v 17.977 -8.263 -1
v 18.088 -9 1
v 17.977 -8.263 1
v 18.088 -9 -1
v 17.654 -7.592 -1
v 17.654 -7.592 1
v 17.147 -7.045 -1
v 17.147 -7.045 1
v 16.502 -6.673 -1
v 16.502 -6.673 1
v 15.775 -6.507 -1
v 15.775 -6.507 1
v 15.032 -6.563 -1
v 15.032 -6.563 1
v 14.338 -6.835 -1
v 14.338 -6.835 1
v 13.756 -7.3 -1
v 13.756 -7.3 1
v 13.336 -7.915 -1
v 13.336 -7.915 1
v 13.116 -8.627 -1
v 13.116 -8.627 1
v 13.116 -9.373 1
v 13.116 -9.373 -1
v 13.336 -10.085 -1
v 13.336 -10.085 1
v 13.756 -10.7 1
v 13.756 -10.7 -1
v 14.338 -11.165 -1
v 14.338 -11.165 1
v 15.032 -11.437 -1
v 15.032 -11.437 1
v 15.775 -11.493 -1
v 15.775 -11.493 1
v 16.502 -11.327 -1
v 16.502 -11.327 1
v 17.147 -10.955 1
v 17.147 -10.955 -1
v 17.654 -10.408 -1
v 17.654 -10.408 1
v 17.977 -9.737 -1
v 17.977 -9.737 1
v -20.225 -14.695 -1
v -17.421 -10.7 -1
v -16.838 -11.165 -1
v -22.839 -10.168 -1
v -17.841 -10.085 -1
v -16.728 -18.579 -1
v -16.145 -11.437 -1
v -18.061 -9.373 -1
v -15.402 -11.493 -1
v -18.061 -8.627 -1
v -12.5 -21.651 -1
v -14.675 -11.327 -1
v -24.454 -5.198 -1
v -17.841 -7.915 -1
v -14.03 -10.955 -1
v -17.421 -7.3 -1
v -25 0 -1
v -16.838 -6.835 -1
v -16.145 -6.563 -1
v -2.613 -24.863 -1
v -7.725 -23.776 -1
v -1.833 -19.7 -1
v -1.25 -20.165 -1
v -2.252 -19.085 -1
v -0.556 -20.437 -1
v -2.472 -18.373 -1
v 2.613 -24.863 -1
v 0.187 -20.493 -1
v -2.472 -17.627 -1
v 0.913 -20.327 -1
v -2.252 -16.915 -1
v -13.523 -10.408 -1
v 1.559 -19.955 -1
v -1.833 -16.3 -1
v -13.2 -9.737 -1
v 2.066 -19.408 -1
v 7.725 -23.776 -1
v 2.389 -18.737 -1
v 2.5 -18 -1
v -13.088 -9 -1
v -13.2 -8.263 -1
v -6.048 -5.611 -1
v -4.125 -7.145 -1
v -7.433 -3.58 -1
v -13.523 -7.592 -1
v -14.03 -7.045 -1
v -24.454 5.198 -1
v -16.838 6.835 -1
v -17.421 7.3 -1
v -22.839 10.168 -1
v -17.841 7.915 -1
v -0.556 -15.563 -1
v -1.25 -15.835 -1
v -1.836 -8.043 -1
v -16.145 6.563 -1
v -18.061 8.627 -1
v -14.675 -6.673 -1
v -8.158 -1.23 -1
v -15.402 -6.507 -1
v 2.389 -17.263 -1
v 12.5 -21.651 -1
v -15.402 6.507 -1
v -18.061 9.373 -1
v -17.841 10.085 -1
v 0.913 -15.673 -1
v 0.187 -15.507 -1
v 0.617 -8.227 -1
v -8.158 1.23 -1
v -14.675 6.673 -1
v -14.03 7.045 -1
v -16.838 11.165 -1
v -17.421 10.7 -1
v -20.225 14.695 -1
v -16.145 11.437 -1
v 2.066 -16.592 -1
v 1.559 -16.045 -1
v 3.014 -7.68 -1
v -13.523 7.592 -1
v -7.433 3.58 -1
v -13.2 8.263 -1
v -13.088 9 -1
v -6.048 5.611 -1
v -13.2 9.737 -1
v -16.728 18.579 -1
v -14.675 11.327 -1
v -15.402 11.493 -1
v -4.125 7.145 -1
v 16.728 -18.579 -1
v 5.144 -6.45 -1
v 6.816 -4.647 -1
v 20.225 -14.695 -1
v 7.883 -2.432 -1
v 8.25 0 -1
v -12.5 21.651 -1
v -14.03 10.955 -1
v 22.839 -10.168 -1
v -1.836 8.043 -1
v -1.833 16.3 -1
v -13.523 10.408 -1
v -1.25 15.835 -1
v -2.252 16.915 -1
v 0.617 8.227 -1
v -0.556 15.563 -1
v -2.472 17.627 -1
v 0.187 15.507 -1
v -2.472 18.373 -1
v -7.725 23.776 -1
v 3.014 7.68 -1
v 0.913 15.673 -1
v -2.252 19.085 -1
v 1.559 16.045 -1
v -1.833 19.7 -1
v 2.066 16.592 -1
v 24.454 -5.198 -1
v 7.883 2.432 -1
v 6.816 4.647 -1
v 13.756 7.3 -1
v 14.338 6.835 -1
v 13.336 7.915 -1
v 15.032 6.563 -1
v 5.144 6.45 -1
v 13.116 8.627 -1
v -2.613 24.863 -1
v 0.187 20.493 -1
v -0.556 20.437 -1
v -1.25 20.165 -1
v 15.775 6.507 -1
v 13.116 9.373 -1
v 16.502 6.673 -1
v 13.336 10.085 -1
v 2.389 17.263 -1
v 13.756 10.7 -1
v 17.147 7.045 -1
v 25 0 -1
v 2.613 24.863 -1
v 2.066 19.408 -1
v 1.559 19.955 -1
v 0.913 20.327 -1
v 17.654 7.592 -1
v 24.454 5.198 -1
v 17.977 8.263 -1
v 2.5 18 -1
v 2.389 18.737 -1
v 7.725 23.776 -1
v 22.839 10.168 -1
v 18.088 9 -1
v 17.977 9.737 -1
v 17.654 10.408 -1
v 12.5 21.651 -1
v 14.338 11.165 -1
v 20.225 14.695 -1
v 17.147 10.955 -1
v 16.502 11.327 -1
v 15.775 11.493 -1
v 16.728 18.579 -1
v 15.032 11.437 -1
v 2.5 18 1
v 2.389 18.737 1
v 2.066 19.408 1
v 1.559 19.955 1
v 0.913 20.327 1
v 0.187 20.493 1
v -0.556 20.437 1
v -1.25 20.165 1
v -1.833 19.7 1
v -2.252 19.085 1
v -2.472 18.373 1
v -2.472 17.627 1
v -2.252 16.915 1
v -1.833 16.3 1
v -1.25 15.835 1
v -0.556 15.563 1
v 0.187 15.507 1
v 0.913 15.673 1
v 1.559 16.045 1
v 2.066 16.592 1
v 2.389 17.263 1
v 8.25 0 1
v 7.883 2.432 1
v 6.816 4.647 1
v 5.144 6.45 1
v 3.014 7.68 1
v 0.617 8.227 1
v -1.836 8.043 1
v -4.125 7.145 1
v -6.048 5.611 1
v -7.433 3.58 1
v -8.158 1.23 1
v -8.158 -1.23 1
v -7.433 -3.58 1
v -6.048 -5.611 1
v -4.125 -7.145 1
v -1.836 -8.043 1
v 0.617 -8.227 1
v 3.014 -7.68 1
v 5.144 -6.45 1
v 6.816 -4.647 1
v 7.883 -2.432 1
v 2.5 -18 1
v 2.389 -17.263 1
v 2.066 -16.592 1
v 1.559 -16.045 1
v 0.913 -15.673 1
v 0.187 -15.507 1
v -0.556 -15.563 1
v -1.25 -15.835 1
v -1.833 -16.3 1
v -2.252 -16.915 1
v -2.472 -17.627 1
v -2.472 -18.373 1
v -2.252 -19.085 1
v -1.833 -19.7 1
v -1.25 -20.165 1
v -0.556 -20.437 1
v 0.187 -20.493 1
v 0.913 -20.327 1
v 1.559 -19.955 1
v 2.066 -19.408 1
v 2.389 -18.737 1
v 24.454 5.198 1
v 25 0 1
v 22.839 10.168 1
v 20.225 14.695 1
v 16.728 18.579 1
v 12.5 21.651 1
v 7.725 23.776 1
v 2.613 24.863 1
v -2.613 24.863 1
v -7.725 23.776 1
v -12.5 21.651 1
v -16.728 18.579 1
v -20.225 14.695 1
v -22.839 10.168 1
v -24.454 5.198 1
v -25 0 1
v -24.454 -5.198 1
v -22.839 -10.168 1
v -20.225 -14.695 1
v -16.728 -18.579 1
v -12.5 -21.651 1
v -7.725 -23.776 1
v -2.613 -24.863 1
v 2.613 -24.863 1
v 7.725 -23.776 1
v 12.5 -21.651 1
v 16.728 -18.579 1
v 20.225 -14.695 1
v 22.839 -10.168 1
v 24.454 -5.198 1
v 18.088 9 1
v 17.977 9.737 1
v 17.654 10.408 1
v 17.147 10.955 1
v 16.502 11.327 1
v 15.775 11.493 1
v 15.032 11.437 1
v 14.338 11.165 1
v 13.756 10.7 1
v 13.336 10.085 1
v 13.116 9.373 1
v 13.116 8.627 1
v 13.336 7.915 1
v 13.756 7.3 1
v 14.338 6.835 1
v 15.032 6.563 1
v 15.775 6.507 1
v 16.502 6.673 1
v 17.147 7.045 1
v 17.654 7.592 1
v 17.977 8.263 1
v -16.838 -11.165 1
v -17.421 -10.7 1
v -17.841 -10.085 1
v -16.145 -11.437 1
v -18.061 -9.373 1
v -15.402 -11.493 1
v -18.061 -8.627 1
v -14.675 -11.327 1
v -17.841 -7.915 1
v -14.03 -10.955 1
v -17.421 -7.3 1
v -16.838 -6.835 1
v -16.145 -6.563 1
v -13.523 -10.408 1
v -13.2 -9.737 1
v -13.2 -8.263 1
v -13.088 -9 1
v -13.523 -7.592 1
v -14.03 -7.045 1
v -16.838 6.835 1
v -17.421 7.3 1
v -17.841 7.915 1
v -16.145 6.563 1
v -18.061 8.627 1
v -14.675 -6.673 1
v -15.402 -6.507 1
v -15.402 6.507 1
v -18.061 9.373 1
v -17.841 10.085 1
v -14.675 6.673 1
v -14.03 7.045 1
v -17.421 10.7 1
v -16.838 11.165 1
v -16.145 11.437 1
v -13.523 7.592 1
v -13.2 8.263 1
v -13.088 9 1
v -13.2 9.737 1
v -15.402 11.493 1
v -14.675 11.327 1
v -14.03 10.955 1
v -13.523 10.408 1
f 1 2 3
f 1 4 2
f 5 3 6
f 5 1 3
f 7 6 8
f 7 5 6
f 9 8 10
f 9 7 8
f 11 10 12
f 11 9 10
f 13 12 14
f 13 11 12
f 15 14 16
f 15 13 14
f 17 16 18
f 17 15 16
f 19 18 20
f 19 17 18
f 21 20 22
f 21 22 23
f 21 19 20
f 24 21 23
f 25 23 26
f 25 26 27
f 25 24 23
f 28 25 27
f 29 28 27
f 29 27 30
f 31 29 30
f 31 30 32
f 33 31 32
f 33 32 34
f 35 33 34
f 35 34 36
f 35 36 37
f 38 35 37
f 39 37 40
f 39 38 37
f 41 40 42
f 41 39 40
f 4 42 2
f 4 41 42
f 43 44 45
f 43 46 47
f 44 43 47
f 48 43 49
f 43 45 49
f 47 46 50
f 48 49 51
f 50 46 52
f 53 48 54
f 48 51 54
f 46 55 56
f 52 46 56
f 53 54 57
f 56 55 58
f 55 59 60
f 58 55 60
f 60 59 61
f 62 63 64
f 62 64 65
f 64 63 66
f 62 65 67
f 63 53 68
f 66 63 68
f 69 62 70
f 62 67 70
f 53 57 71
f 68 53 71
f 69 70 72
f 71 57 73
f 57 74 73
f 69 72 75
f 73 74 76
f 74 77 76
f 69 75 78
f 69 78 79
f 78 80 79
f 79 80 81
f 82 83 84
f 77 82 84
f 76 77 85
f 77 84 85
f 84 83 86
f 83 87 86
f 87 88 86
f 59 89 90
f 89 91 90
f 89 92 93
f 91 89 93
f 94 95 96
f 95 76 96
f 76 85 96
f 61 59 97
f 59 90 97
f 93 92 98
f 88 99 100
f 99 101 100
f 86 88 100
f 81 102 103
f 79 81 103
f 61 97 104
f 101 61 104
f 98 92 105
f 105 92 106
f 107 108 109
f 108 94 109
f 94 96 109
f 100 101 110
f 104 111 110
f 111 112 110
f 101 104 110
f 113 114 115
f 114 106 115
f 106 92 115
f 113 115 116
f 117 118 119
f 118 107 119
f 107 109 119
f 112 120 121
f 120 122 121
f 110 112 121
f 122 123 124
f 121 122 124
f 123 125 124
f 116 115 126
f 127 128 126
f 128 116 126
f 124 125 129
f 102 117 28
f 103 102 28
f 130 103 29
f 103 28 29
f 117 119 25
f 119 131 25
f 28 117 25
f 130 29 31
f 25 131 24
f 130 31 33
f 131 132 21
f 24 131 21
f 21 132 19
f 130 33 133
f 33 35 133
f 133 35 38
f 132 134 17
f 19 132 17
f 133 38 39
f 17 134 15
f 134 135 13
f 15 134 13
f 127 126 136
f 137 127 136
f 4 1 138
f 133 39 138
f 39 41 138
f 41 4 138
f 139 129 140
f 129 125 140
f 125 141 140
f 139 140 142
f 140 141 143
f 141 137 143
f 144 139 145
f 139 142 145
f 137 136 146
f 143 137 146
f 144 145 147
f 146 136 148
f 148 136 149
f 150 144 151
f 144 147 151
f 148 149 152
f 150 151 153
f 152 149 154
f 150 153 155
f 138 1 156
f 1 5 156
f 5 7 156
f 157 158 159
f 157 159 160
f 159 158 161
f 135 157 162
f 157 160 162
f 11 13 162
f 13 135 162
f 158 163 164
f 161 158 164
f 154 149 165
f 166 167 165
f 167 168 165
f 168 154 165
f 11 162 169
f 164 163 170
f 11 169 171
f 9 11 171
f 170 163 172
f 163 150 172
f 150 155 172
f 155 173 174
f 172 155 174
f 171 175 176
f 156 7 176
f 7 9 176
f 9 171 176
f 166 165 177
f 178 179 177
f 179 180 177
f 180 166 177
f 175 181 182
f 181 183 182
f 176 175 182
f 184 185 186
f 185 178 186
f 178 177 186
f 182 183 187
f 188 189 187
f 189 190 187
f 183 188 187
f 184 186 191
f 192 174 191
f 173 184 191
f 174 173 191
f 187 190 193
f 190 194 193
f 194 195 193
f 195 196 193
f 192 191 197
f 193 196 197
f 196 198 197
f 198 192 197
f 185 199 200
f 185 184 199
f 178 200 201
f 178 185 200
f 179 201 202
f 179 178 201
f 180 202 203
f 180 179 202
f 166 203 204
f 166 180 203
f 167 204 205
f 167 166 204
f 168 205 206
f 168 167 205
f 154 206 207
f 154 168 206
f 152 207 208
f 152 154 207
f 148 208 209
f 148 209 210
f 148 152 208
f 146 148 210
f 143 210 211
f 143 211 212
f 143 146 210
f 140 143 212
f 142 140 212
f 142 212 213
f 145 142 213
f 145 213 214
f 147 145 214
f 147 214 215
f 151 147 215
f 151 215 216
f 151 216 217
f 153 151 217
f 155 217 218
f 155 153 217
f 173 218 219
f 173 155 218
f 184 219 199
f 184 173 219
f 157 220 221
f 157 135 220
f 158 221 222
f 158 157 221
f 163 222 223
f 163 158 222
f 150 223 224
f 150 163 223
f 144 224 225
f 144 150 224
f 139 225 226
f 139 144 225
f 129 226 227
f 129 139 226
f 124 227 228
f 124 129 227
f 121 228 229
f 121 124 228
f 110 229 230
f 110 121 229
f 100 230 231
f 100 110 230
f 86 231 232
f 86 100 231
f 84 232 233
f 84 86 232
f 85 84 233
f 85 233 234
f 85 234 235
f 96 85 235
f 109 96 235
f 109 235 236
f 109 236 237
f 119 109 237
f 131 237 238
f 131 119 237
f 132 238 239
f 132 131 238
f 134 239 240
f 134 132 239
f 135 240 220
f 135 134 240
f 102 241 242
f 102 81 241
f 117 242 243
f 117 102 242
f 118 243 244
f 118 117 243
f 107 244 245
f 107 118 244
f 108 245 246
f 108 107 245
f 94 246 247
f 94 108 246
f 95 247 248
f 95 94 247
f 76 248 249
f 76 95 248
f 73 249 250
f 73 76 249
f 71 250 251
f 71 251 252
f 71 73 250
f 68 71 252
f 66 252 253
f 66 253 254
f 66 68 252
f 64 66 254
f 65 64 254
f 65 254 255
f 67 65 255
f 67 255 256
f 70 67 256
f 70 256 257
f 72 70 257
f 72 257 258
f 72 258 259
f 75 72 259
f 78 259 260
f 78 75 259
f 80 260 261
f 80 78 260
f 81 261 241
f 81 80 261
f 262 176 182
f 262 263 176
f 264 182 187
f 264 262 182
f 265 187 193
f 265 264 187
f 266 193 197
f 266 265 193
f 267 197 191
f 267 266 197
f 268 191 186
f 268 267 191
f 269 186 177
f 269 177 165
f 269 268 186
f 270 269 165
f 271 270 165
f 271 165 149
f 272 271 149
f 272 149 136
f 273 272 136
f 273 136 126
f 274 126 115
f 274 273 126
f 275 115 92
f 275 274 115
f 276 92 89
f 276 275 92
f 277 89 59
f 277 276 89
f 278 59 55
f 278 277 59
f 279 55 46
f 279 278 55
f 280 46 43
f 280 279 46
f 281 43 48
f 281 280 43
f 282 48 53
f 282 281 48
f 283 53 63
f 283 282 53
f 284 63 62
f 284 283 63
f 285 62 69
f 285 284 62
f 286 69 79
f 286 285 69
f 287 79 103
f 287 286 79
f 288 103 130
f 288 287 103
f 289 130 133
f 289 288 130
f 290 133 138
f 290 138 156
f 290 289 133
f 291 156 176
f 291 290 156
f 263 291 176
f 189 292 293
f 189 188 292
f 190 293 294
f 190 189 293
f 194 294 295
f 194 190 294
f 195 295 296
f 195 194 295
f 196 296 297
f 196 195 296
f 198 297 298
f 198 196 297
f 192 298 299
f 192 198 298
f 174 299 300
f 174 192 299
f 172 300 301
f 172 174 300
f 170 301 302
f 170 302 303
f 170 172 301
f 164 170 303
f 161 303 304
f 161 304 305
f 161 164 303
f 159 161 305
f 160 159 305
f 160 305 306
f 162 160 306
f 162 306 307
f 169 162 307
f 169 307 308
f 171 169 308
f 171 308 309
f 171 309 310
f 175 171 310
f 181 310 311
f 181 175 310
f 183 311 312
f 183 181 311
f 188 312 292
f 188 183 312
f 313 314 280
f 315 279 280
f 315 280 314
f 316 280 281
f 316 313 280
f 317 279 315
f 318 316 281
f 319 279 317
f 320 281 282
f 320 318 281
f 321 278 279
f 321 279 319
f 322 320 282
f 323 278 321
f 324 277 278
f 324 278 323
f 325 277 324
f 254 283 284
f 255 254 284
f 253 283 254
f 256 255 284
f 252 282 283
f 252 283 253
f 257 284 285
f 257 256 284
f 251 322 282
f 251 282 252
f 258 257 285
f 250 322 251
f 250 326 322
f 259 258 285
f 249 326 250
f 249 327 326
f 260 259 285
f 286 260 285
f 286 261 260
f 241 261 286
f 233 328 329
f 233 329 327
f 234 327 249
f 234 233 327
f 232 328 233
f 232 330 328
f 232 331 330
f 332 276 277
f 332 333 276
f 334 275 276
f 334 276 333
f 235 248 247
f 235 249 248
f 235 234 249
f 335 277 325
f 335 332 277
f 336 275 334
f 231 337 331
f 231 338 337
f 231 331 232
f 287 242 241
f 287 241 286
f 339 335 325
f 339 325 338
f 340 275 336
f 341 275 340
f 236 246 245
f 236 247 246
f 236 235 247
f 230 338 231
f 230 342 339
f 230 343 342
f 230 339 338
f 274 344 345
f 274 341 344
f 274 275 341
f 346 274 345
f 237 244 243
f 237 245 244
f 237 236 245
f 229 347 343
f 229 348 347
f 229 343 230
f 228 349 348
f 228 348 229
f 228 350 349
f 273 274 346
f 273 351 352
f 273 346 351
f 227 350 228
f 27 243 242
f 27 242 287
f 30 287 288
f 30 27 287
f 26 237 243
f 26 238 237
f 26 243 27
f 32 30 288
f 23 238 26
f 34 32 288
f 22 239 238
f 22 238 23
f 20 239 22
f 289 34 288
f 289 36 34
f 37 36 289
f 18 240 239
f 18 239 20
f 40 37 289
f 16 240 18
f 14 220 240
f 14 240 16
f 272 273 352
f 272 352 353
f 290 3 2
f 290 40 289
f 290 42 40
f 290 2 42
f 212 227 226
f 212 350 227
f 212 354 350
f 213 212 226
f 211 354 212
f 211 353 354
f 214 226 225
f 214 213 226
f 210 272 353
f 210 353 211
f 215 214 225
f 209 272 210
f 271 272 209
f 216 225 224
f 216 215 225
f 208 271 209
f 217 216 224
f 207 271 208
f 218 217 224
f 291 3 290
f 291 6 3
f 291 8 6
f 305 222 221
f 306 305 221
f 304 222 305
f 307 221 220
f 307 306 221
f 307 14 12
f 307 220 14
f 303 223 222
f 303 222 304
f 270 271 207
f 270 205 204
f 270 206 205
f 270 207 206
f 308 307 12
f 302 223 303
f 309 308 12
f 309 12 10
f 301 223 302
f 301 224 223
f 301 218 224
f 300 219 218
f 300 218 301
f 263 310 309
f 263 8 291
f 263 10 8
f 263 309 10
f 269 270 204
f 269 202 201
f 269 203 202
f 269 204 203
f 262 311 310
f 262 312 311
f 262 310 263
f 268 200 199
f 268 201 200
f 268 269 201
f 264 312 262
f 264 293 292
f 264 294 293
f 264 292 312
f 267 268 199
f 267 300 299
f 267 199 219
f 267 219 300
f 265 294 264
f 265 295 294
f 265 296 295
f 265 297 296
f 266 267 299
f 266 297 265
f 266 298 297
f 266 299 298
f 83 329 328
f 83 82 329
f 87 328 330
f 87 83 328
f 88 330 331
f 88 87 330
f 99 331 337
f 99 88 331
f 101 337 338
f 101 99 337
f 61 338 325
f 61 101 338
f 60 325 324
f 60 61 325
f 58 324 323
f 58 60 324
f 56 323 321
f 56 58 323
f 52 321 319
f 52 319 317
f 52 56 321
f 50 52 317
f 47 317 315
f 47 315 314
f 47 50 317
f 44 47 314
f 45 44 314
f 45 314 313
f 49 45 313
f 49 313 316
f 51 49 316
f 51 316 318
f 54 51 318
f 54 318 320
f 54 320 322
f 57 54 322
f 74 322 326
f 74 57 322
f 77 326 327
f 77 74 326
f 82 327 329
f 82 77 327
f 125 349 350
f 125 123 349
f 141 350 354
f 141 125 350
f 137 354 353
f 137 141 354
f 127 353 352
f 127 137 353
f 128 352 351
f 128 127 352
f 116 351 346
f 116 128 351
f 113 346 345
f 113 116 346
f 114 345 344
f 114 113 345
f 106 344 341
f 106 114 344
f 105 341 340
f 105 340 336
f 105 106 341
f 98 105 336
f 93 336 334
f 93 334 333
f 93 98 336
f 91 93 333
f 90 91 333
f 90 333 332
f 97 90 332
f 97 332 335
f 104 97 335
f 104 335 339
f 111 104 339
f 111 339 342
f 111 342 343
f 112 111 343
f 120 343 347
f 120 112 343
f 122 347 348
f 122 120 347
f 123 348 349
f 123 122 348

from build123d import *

# Parameters (mm, degrees)
SKETCH1_R           = 25
SKETCH1_R_2         = 8.25
SKETCH1_R_3         = 2.5
BOSS_EXTRUDE1_DEPTH = 1


with BuildPart() as part:
    # Sketch1 (on Front Plane) → Boss-Extrude1 (new, symmetric)
    with BuildSketch(Plane.XY):
        Circle(SKETCH1_R)
        Circle(SKETCH1_R_2, mode=Mode.SUBTRACT)
        with Locations((0, 18)):
            Circle(SKETCH1_R_3, mode=Mode.SUBTRACT)
        with Locations((15.588457268, 9)):
            Circle(SKETCH1_R_3, mode=Mode.SUBTRACT)
        with Locations((15.588457268, -9)):
            Circle(SKETCH1_R_3, mode=Mode.SUBTRACT)
        with Locations((0, -18)):
            Circle(SKETCH1_R_3, mode=Mode.SUBTRACT)
        with Locations((-15.588457268, -9)):
            Circle(SKETCH1_R_3, mode=Mode.SUBTRACT)
        with Locations((-15.588457268, 9)):
            Circle(SKETCH1_R_3, mode=Mode.SUBTRACT)
    extrude(amount=BOSS_EXTRUDE1_DEPTH, both=True)


solid = part.part
